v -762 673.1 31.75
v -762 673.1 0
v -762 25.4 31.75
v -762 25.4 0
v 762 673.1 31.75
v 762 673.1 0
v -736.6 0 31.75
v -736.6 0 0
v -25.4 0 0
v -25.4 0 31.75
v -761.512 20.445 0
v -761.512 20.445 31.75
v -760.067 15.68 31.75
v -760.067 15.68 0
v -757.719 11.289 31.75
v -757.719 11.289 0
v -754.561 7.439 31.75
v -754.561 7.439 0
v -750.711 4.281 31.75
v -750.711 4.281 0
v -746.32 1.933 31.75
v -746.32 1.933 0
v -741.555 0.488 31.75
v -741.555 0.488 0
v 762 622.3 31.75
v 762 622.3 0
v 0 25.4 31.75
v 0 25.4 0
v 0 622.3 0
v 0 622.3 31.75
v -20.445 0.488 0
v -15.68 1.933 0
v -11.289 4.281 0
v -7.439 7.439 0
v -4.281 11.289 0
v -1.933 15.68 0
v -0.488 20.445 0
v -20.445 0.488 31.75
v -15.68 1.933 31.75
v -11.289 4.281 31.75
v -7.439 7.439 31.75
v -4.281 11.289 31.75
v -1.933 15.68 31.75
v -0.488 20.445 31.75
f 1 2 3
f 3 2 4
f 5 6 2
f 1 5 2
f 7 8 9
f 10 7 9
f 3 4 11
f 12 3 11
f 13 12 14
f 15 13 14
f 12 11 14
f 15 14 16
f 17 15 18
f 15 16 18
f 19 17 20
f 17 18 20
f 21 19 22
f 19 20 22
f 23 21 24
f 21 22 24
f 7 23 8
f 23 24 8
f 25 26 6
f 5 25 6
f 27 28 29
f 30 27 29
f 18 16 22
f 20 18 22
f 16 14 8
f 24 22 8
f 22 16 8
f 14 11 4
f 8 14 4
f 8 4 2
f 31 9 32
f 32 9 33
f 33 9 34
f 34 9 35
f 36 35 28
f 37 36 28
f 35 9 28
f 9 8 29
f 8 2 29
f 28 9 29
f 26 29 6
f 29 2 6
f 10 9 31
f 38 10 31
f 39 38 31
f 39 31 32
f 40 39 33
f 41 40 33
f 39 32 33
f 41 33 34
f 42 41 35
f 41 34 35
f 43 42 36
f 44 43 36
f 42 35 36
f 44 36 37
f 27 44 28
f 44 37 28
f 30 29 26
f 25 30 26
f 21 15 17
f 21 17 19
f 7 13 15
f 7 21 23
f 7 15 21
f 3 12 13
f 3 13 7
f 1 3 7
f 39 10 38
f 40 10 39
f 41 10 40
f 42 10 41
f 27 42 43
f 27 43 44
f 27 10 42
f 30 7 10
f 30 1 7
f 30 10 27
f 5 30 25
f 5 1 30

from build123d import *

# Parameters (mm, degrees)
F1_DEPTH = 31.75


with BuildPart() as f1:
    # F0 (on Top) → F1 (new body)
    with BuildSketch(Plane.XY):
        with BuildLine():
            Line((-736.6, 0), (-25.4, 0))
            ThreePointArc((-25.4, 0), (-7.439488, 7.439488), (0, 25.4))
            Line((0, 25.4), (0, 622.3))
            Line((0, 622.3), (762, 622.3))
            Line((762, 622.3), (762, 673.1))
            Line((762, 673.1), (-762, 673.1))
            Line((-762, 673.1), (-762, 25.4))
            ThreePointArc((-762, 25.4), (-754.560512, 7.439488), (-736.6, 0))
        make_face()
    extrude(amount=F1_DEPTH)


solid = f1.part
